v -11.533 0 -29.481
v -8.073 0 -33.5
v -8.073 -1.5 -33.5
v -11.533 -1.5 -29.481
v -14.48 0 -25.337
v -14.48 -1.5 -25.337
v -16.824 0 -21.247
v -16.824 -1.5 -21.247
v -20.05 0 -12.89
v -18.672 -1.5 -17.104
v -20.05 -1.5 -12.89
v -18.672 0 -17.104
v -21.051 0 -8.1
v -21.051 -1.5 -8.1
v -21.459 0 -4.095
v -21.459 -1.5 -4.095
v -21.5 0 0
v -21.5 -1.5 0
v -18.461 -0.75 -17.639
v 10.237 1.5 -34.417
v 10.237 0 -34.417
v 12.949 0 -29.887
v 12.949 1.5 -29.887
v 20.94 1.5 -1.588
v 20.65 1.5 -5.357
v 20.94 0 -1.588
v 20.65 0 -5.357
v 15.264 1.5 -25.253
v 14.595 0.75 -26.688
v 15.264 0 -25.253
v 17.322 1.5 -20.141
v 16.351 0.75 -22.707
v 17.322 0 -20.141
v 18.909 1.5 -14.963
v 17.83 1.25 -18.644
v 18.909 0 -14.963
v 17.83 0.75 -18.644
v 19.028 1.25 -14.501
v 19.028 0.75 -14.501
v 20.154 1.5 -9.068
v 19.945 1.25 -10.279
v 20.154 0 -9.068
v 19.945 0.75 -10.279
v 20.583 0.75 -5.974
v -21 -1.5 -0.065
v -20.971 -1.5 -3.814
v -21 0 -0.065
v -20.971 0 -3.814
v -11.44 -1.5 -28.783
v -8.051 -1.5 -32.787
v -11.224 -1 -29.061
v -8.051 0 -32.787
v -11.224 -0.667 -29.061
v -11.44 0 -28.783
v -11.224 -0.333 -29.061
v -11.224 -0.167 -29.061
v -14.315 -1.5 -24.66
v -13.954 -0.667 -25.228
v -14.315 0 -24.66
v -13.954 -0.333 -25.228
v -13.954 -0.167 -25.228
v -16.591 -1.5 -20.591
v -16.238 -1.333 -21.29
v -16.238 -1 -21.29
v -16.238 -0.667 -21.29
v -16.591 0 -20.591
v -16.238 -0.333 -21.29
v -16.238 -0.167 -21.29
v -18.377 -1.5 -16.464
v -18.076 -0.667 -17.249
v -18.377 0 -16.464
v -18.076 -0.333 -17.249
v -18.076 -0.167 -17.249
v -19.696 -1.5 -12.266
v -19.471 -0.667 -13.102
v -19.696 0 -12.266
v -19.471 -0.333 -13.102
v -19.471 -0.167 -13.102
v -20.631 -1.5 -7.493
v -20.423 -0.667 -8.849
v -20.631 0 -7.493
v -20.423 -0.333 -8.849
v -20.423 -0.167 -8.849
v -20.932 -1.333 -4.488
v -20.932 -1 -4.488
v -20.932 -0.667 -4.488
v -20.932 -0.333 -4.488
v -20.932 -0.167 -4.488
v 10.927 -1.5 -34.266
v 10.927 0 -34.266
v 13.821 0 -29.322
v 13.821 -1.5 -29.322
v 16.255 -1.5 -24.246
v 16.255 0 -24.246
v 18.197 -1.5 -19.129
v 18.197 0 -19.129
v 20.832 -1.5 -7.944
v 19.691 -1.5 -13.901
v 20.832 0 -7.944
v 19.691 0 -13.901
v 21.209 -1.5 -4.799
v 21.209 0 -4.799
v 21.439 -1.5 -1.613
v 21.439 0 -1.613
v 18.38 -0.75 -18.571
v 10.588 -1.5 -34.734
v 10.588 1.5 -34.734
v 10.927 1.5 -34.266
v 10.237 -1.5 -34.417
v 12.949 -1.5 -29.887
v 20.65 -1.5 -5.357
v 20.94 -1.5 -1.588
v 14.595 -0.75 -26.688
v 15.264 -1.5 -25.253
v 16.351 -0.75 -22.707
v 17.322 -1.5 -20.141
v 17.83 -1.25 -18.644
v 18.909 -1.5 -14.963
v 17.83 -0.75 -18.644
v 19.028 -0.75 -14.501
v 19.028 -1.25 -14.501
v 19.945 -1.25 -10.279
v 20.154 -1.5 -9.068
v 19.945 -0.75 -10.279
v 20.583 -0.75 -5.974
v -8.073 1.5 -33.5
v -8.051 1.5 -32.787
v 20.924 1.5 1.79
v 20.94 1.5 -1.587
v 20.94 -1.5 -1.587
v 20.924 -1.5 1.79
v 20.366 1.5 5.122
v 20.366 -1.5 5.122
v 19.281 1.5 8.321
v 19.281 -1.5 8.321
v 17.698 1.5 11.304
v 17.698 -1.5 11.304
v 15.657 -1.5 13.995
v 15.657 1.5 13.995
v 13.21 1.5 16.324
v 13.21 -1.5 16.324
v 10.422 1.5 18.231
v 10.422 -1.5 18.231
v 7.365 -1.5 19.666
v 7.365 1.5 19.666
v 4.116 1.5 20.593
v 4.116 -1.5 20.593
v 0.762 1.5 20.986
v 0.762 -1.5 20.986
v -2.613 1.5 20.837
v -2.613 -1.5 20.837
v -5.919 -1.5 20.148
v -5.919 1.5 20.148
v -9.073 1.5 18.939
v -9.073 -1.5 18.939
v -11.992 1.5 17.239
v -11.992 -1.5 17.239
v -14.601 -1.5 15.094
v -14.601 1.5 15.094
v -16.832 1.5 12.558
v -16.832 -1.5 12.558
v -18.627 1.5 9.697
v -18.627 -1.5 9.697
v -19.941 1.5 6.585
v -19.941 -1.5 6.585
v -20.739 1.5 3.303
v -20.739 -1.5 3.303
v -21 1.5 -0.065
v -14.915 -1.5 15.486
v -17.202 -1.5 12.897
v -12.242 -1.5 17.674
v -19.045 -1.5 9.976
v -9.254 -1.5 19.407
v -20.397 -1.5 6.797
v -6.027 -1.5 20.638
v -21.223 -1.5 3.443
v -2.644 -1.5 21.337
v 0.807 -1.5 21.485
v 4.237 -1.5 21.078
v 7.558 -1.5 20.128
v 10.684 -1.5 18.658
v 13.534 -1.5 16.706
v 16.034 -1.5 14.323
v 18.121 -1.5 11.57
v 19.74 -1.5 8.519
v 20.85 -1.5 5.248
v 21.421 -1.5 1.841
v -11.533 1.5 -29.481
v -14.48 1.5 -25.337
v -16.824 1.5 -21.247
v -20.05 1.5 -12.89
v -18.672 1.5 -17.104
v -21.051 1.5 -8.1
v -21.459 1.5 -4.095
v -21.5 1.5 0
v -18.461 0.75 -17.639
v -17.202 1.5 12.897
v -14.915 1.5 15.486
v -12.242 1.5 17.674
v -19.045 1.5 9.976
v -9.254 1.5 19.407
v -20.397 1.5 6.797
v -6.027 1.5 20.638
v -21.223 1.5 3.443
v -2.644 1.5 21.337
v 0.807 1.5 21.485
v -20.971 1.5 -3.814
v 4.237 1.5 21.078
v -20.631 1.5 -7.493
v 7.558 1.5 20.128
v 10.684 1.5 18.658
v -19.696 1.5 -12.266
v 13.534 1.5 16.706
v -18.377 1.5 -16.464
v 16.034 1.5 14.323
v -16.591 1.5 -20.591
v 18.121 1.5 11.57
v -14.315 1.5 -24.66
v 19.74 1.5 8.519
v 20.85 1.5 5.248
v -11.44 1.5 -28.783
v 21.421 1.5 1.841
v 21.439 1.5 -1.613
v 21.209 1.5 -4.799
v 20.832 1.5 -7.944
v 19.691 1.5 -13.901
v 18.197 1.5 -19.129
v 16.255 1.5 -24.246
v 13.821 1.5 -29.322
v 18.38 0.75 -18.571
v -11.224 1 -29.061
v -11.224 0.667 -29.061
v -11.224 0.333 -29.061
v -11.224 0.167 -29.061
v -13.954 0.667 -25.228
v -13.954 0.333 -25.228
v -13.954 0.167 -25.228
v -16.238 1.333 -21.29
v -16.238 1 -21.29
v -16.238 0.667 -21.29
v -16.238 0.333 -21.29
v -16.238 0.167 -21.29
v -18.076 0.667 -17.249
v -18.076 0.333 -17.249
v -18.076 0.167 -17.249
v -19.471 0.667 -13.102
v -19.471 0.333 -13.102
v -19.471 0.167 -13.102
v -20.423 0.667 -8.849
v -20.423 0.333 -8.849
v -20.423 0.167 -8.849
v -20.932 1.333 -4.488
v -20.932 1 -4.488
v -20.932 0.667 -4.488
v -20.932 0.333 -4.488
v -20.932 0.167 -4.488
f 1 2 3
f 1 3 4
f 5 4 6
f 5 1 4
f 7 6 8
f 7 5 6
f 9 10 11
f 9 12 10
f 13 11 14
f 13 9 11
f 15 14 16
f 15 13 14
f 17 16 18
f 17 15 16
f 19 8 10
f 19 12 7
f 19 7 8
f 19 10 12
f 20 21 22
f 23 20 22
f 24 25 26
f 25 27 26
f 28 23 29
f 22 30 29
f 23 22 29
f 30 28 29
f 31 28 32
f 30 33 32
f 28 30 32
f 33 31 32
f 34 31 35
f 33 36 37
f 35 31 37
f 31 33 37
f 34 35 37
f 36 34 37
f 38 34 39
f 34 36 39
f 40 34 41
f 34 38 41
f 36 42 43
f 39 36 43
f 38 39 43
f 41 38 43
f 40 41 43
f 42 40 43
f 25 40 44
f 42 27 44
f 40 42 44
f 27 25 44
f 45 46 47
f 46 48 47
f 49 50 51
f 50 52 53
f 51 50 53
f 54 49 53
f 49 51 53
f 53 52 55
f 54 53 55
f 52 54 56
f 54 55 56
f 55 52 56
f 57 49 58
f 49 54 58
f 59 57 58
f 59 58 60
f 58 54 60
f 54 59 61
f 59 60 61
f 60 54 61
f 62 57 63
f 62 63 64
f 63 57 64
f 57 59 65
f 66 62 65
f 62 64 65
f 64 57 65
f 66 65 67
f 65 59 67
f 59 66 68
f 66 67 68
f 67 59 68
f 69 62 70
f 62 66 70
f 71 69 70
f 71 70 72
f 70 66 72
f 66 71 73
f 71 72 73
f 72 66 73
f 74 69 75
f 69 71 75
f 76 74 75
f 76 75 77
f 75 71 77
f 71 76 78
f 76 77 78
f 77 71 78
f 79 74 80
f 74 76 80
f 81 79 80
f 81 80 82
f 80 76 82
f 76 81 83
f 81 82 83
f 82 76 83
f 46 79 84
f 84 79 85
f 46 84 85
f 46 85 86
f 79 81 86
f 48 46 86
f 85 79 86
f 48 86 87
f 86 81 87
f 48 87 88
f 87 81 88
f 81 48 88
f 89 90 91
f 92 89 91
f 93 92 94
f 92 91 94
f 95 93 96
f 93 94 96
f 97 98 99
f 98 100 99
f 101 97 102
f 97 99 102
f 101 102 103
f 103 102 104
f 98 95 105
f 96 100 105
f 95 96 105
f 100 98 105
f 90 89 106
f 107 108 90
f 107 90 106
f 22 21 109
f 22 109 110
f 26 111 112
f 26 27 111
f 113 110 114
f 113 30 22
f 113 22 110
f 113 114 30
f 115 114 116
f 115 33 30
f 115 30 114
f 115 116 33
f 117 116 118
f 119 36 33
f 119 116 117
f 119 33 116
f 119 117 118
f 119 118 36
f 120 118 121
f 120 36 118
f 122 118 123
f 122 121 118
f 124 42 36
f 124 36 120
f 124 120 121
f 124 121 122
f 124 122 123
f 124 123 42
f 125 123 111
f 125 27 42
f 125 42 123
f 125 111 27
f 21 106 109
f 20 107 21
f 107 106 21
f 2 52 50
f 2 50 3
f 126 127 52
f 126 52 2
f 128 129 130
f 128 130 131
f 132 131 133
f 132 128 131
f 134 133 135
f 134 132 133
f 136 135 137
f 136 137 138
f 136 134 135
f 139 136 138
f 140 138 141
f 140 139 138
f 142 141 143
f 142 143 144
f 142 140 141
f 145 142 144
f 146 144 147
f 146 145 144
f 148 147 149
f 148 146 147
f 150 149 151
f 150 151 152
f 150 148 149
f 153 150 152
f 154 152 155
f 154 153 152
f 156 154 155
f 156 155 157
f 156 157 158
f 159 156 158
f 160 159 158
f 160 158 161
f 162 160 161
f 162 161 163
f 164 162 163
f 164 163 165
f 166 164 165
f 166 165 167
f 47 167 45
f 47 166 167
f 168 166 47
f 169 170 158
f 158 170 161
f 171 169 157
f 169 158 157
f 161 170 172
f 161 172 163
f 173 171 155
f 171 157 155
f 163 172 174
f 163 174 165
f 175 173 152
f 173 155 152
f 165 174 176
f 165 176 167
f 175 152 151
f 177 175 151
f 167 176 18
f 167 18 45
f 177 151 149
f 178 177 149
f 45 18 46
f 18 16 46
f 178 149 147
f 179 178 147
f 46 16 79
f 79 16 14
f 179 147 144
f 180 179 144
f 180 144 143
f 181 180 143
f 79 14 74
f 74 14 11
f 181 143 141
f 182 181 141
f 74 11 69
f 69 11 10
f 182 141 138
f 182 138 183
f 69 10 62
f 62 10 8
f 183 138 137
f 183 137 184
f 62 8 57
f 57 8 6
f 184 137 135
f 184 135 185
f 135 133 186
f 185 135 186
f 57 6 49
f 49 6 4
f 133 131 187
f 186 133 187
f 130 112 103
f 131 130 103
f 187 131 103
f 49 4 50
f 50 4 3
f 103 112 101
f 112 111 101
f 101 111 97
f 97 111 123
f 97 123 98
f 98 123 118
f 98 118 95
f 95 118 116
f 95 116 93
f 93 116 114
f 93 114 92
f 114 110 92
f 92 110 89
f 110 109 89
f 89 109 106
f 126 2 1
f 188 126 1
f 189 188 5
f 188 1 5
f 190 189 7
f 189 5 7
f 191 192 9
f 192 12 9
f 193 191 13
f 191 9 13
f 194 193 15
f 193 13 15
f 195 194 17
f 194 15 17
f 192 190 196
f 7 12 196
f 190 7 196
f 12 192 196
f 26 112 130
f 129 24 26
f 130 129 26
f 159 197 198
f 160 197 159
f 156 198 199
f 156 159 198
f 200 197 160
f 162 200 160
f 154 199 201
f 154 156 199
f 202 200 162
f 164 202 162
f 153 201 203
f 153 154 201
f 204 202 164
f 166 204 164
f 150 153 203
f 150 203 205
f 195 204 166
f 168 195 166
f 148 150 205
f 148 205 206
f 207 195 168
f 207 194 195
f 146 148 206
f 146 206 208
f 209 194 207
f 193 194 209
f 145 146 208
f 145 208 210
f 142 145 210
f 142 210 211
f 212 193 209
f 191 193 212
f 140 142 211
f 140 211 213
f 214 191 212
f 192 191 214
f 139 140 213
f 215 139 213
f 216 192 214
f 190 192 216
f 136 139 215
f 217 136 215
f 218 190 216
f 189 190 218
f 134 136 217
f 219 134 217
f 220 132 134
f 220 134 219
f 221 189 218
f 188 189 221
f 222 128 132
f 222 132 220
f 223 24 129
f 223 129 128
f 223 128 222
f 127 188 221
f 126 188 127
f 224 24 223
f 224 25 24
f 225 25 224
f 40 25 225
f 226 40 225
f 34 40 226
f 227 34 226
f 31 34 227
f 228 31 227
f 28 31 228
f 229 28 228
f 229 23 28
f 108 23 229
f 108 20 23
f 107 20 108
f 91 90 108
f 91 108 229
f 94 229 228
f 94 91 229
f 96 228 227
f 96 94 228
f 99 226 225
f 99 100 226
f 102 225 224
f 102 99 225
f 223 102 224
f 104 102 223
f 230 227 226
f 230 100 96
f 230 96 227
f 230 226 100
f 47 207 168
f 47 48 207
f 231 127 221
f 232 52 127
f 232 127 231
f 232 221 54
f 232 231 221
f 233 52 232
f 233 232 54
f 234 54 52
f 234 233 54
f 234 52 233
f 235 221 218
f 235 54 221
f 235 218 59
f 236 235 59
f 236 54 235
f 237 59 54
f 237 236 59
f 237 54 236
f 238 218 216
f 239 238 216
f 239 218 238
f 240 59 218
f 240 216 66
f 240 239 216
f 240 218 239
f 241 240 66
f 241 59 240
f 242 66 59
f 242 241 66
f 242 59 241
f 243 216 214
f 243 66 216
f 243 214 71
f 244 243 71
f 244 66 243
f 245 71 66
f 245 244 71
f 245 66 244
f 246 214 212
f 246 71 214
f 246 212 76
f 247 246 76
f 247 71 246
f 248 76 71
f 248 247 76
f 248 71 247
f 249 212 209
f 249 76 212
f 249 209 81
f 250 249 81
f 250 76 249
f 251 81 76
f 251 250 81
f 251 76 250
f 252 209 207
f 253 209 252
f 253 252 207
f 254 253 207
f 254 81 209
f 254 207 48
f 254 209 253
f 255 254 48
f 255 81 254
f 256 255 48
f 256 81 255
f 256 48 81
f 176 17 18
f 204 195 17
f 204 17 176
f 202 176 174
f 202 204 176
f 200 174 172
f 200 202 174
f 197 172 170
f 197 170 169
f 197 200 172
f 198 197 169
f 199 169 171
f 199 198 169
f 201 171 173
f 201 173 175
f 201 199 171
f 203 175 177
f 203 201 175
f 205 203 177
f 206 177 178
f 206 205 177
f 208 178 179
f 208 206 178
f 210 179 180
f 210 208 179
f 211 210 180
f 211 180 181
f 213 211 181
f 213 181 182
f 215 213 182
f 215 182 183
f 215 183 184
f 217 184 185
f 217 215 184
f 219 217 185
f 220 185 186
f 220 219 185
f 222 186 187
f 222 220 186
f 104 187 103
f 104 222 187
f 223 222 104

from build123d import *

# Parameters (mm, degrees)
EXTRUDE_1_DEPTH = 1.5


with BuildPart() as part:
    # 草图1 → 拉伸1 (new, symmetric)
    with BuildSketch(Plane(origin=(0, 0, 0), x_dir=(1, 0, 0), z_dir=(0, 1, 0))):
        with BuildLine():
            Line((20.940011064, 1.58846533), (20.939920521, 1.58736529))
            ThreePointArc((20.939920521, 1.58736529), (0.761777461, -20.986178668), (-20.999899431, 0.064991443))
            add(Edge.make_bspline(
                [(-8.051332909, 32.78715945), (-8.610349318, 32.182398754), (-9.714361715, 30.939196238), (-11.751951037, 28.441519755), (-14.028887881, 25.244274154), (-16.311662528, 21.307878415), (-18.150397892, 17.266249907), (-19.545128941, 13.120876546), (-20.496807064, 8.86508597), (-21.004475075, 4.530924038), (-21.049002229, 1.538986899), (-20.999899431, 0.064991443)],
                knots=[0.004872267, 0.004872267, 0.004872267, 0.004872267, 0.02895963, 0.053109791, 0.101410114, 0.149710437, 0.198010759, 0.246311082, 0.294611405, 0.342911728, 0.39069527, 0.39069527, 0.39069527, 0.39069527], degree=3))
            Line((-8.051332909, 32.78715945), (-8.072524116, 33.5))
            add(Edge.make_bspline(
                [(-8.072524116, 33.5), (-22.136696557, 18.527333844), (-21.5, 0)],
                knots=[0, 0, 0, 0.391212051, 0.391212051, 0.391212051], degree=2))
            ThreePointArc((-21.5, 0), (0.807061405, -21.48484703), (21.439409478, 1.612985193))
            add(Edge.make_bspline(
                [(10.927475884, 34.265791626), (20.575756572, 19.203087379), (21.439409478, 1.612985193)],
                knots=[0, 0, 0, 0.204404978, 0.204404978, 0.204404978], degree=2))
            Line((10.927475884, 34.265791626), (10.588152757, 34.734289031))
            Line((10.588152757, 34.734289031), (10.236755206, 34.417135424))
            add(Edge.make_bspline(
                [(10.236755206, 34.417135424), (11.041253847, 33.161168119), (12.610265397, 30.600103215), (15.317060933, 25.402889951), (18.018451366, 18.698039733), (19.779296418, 11.724493606), (20.629070045, 5.992876218), (20.868076786, 3.053557708), (20.940011064, 1.58846533)],
                knots=[-0.002856761, -0.002856761, -0.002856761, -0.002856761, 0.023050957, 0.048958674, 0.100774109, 0.152589544, 0.178497261, 0.204404978, 0.204404978, 0.204404978, 0.204404978], degree=3))
        make_face()
    extrude(amount=EXTRUDE_1_DEPTH, both=True)


solid = part.part
